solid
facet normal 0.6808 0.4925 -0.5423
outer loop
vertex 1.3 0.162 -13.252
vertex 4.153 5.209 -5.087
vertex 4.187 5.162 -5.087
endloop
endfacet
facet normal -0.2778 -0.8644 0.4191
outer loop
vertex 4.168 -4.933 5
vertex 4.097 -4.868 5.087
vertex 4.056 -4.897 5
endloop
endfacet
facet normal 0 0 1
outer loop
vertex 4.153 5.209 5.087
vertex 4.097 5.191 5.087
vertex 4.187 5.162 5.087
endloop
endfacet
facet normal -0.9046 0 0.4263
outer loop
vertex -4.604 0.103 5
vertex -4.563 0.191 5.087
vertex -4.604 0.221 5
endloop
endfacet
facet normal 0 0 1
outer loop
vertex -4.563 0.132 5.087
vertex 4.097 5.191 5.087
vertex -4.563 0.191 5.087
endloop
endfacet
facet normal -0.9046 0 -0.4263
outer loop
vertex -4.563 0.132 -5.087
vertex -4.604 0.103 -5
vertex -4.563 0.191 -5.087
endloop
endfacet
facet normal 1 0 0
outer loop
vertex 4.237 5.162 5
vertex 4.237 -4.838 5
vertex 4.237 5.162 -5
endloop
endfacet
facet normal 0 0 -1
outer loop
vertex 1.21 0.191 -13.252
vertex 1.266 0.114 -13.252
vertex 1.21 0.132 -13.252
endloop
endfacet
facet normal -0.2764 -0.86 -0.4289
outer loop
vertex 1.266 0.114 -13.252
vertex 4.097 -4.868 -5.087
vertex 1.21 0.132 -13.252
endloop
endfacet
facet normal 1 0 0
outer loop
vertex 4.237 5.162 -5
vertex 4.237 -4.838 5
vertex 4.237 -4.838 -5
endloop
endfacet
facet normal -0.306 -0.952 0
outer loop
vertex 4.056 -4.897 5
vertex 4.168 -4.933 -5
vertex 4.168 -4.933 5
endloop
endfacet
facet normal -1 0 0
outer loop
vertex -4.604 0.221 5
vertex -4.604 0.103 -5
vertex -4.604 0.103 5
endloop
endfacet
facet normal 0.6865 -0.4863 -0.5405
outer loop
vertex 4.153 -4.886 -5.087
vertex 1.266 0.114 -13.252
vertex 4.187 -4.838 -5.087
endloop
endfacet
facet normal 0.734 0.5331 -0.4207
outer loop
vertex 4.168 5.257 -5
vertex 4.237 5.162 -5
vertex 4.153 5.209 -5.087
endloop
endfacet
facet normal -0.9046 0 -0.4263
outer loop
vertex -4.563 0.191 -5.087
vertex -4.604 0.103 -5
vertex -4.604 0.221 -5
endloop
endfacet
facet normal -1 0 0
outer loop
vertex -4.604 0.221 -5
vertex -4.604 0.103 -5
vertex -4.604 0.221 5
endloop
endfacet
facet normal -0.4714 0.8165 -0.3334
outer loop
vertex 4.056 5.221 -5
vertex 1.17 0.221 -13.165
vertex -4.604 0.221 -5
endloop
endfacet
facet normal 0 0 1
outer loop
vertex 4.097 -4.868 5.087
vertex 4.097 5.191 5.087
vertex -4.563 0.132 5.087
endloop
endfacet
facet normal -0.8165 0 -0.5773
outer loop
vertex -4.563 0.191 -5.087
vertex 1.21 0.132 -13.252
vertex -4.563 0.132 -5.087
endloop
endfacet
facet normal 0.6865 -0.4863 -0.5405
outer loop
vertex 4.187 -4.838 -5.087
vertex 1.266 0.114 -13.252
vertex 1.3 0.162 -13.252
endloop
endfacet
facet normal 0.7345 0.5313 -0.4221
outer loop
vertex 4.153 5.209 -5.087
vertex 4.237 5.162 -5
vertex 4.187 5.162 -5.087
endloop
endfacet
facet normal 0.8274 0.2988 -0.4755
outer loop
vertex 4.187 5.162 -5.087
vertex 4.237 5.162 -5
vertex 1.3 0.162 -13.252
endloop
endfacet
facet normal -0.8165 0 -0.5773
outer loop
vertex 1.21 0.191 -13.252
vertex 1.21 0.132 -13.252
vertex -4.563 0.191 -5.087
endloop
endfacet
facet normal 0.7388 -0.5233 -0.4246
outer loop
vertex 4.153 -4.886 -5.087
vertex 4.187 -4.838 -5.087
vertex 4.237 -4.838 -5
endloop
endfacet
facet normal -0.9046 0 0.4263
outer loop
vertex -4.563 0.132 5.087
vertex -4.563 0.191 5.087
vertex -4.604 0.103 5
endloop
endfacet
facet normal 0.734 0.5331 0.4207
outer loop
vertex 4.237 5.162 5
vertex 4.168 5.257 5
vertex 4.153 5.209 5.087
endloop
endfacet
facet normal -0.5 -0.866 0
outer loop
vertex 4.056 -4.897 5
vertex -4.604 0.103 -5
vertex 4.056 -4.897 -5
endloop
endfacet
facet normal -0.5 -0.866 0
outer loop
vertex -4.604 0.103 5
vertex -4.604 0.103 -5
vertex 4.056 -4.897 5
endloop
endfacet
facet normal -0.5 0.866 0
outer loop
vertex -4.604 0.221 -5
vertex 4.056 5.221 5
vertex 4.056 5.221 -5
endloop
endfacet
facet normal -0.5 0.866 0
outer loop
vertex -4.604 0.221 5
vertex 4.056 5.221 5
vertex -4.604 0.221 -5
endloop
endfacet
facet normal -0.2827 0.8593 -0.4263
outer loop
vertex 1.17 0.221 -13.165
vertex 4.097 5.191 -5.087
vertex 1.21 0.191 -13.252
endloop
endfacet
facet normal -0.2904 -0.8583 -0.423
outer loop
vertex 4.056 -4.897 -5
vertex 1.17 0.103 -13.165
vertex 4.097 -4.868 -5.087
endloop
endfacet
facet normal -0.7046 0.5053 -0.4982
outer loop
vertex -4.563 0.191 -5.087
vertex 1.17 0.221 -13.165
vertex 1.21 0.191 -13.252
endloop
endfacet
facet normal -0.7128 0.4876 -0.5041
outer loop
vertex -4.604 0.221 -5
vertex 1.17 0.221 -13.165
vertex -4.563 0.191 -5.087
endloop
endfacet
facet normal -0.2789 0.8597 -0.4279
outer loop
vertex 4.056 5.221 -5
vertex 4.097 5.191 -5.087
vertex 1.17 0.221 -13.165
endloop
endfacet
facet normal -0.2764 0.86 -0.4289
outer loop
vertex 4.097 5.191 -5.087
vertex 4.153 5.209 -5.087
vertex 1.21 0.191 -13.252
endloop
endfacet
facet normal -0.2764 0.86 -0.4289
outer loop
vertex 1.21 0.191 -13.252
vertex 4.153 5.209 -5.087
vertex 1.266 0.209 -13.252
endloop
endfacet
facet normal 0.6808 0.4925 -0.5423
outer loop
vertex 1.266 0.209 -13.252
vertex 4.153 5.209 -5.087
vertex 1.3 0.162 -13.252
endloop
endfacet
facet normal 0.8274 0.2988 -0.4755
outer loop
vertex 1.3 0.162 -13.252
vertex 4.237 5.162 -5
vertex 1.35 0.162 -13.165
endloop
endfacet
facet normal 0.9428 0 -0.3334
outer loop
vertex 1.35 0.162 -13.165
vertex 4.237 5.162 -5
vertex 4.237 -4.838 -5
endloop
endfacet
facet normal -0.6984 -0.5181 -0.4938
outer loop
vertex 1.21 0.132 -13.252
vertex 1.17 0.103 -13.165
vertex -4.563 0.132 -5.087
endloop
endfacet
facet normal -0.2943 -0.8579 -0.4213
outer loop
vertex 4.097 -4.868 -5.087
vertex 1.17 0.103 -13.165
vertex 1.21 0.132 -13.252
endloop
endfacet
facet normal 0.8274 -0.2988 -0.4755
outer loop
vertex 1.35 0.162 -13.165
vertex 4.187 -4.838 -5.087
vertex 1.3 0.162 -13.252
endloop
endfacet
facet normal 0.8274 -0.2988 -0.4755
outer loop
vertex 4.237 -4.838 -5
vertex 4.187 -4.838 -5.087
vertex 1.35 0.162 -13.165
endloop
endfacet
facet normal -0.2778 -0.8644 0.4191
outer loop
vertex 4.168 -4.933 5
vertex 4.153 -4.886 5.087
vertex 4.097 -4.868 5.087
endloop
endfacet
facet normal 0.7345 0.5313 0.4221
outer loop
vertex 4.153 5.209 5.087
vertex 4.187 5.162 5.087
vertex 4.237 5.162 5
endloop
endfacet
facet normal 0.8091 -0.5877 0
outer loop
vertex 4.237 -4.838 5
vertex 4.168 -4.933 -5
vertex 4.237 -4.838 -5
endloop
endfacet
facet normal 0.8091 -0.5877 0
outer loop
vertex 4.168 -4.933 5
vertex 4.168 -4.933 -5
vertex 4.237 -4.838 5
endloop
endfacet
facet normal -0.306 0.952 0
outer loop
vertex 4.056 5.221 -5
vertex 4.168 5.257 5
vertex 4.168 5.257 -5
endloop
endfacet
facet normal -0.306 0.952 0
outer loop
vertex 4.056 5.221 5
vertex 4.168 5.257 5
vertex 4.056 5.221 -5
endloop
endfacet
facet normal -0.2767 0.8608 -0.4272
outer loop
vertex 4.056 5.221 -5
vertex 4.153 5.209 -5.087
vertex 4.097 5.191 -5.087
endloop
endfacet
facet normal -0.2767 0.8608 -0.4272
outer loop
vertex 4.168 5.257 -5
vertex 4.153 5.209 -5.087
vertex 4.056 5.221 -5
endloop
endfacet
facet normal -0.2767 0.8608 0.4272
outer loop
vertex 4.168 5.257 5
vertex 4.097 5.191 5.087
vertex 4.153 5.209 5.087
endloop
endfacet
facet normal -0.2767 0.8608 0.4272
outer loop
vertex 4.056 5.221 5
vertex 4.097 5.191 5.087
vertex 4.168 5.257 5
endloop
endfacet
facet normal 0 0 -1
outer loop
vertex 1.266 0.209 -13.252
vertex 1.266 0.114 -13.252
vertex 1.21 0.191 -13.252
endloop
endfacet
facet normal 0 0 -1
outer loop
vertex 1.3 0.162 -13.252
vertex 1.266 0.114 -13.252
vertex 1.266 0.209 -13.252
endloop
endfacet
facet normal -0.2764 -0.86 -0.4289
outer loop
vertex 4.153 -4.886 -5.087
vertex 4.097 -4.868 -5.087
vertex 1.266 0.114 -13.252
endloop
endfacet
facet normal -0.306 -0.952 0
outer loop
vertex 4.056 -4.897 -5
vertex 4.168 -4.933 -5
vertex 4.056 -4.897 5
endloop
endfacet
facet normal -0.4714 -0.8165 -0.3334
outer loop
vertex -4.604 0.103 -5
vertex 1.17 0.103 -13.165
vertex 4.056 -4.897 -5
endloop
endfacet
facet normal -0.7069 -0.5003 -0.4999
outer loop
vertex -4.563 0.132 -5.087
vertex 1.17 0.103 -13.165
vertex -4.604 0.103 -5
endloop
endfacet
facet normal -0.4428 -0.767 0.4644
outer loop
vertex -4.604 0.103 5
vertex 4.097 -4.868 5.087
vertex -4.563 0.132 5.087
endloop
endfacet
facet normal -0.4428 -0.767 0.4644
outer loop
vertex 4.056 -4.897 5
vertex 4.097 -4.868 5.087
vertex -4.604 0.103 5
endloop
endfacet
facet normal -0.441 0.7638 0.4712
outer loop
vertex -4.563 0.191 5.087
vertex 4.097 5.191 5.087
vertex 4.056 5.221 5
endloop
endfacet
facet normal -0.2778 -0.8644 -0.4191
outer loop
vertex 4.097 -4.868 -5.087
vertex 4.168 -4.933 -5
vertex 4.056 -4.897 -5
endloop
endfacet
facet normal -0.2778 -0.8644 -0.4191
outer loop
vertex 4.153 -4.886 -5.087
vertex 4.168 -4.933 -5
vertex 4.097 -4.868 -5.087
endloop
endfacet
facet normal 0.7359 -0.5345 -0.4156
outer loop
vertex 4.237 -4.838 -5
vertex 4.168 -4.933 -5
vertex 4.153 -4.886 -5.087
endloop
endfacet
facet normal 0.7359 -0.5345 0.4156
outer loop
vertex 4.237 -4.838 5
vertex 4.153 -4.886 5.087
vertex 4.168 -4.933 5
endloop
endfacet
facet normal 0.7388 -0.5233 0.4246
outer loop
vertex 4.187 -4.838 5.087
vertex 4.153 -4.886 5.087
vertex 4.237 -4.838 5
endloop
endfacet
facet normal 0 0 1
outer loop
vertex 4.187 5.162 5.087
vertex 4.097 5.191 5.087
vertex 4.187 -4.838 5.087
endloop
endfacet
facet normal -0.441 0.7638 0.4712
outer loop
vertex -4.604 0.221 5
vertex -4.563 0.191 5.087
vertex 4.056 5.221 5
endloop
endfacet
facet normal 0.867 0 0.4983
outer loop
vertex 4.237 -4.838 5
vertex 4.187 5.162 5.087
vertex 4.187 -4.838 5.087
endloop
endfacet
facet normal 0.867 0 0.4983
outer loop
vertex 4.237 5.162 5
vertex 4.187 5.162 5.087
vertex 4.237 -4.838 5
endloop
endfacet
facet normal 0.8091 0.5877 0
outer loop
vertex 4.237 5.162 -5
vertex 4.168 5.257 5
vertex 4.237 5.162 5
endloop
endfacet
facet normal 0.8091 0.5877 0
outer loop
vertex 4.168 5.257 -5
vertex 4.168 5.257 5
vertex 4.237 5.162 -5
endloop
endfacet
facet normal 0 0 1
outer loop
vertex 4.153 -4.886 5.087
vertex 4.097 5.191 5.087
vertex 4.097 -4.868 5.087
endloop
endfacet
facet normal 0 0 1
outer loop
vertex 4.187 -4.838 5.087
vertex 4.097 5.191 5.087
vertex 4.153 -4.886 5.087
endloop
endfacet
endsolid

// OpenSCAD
// Auto-generated OpenSCAD file

    inner_points = 10*[[0.41372241203438104, 0.5161844232125496, -0.5000000000005286], [0.41372241203630644, 0.5161844232124951, 0.4999999999994715], [-0.4523012409070252, 0.01618139067572292, -0.49999999999888844], [-0.45230124090509977, 0.01618139067566849, 0.5000000000011117], [0.4137259137098271, -0.48381557678131953, -0.500000000000583], [0.41372591371175244, -0.483815576781374, 0.49999999999941697], [0.125049028277489, 0.016183412369028788, -1.316496580927726]];

    outer_points = 10*[[-0.47409817149378863, 0.5195152510494393, 0.29777199506773233], [-0.5358247145183108, -0.47788127840371986, 0.2604893325952726], [0.04291122844378145, 0.5195152510494393, -0.5582077245379332], [-0.018815314580740705, -0.47788127840371986, -0.5954903870103929], [0.5237767575867904, 0.4570642920808602, 0.3163597231788905], [0.4620502145622683, -0.540332237372299, 0.2790770607064307], [0.08126278284427152, 1.313069120854264, 0.049082497672875716]];

    // Convex hull for inner set (I)
    module inner_hull() {
        hull() {
            for (p = inner_points) {
                translate(p) sphere(r=0.1);
            }
        }
    }

    // Convex hull for outer set (O) minus inner hull (O \ I)
    module outer_minus_inner() {
        difference() {
            hull() {
                for (p = outer_points) {
                    translate(p) sphere(r=0.1);
                }
            }
            inner_hull(); // Subtract inner hull
        }
    }

    // Convex hull for outer set (O) minus all translated inner hulls
    module outer_minus_AllTranslationInner() {
        difference() {
            hull() {
                for (p = outer_points) {
                    translate(p) sphere(r=0.1);
                }
            }
            hull() {
                translate([0,0,50]) inner_hull();
                translate([0,0,-50]) inner_hull();
            }; // Subtract translated inner hulls
        }
    }

    // Difference between outer_minus_inner and outer_minus_AllTranslationInner
    module outer_minus_inner_diff() {
        difference() {
            // Outer minus inner
            difference() {
                hull() {
                    for (p = outer_points) {
                        translate(p) sphere(r=0.1);
                    }
                }
                inner_hull();
            }

            // Subtract Outer minus AllTranslationInner
            difference() {
                hull() {
                    for (p = outer_points) {
                        translate(p) sphere(r=0.1);
                    }
                }
                hull() {
                    translate([0,0,50]) inner_hull();
                    translate([0,0,-50]) inner_hull();
                };
            }
        }
    }

    // Rendering all with colors applied
    color([1, 0, 0, 0.5]) inner_hull(); // Transparent red
    
